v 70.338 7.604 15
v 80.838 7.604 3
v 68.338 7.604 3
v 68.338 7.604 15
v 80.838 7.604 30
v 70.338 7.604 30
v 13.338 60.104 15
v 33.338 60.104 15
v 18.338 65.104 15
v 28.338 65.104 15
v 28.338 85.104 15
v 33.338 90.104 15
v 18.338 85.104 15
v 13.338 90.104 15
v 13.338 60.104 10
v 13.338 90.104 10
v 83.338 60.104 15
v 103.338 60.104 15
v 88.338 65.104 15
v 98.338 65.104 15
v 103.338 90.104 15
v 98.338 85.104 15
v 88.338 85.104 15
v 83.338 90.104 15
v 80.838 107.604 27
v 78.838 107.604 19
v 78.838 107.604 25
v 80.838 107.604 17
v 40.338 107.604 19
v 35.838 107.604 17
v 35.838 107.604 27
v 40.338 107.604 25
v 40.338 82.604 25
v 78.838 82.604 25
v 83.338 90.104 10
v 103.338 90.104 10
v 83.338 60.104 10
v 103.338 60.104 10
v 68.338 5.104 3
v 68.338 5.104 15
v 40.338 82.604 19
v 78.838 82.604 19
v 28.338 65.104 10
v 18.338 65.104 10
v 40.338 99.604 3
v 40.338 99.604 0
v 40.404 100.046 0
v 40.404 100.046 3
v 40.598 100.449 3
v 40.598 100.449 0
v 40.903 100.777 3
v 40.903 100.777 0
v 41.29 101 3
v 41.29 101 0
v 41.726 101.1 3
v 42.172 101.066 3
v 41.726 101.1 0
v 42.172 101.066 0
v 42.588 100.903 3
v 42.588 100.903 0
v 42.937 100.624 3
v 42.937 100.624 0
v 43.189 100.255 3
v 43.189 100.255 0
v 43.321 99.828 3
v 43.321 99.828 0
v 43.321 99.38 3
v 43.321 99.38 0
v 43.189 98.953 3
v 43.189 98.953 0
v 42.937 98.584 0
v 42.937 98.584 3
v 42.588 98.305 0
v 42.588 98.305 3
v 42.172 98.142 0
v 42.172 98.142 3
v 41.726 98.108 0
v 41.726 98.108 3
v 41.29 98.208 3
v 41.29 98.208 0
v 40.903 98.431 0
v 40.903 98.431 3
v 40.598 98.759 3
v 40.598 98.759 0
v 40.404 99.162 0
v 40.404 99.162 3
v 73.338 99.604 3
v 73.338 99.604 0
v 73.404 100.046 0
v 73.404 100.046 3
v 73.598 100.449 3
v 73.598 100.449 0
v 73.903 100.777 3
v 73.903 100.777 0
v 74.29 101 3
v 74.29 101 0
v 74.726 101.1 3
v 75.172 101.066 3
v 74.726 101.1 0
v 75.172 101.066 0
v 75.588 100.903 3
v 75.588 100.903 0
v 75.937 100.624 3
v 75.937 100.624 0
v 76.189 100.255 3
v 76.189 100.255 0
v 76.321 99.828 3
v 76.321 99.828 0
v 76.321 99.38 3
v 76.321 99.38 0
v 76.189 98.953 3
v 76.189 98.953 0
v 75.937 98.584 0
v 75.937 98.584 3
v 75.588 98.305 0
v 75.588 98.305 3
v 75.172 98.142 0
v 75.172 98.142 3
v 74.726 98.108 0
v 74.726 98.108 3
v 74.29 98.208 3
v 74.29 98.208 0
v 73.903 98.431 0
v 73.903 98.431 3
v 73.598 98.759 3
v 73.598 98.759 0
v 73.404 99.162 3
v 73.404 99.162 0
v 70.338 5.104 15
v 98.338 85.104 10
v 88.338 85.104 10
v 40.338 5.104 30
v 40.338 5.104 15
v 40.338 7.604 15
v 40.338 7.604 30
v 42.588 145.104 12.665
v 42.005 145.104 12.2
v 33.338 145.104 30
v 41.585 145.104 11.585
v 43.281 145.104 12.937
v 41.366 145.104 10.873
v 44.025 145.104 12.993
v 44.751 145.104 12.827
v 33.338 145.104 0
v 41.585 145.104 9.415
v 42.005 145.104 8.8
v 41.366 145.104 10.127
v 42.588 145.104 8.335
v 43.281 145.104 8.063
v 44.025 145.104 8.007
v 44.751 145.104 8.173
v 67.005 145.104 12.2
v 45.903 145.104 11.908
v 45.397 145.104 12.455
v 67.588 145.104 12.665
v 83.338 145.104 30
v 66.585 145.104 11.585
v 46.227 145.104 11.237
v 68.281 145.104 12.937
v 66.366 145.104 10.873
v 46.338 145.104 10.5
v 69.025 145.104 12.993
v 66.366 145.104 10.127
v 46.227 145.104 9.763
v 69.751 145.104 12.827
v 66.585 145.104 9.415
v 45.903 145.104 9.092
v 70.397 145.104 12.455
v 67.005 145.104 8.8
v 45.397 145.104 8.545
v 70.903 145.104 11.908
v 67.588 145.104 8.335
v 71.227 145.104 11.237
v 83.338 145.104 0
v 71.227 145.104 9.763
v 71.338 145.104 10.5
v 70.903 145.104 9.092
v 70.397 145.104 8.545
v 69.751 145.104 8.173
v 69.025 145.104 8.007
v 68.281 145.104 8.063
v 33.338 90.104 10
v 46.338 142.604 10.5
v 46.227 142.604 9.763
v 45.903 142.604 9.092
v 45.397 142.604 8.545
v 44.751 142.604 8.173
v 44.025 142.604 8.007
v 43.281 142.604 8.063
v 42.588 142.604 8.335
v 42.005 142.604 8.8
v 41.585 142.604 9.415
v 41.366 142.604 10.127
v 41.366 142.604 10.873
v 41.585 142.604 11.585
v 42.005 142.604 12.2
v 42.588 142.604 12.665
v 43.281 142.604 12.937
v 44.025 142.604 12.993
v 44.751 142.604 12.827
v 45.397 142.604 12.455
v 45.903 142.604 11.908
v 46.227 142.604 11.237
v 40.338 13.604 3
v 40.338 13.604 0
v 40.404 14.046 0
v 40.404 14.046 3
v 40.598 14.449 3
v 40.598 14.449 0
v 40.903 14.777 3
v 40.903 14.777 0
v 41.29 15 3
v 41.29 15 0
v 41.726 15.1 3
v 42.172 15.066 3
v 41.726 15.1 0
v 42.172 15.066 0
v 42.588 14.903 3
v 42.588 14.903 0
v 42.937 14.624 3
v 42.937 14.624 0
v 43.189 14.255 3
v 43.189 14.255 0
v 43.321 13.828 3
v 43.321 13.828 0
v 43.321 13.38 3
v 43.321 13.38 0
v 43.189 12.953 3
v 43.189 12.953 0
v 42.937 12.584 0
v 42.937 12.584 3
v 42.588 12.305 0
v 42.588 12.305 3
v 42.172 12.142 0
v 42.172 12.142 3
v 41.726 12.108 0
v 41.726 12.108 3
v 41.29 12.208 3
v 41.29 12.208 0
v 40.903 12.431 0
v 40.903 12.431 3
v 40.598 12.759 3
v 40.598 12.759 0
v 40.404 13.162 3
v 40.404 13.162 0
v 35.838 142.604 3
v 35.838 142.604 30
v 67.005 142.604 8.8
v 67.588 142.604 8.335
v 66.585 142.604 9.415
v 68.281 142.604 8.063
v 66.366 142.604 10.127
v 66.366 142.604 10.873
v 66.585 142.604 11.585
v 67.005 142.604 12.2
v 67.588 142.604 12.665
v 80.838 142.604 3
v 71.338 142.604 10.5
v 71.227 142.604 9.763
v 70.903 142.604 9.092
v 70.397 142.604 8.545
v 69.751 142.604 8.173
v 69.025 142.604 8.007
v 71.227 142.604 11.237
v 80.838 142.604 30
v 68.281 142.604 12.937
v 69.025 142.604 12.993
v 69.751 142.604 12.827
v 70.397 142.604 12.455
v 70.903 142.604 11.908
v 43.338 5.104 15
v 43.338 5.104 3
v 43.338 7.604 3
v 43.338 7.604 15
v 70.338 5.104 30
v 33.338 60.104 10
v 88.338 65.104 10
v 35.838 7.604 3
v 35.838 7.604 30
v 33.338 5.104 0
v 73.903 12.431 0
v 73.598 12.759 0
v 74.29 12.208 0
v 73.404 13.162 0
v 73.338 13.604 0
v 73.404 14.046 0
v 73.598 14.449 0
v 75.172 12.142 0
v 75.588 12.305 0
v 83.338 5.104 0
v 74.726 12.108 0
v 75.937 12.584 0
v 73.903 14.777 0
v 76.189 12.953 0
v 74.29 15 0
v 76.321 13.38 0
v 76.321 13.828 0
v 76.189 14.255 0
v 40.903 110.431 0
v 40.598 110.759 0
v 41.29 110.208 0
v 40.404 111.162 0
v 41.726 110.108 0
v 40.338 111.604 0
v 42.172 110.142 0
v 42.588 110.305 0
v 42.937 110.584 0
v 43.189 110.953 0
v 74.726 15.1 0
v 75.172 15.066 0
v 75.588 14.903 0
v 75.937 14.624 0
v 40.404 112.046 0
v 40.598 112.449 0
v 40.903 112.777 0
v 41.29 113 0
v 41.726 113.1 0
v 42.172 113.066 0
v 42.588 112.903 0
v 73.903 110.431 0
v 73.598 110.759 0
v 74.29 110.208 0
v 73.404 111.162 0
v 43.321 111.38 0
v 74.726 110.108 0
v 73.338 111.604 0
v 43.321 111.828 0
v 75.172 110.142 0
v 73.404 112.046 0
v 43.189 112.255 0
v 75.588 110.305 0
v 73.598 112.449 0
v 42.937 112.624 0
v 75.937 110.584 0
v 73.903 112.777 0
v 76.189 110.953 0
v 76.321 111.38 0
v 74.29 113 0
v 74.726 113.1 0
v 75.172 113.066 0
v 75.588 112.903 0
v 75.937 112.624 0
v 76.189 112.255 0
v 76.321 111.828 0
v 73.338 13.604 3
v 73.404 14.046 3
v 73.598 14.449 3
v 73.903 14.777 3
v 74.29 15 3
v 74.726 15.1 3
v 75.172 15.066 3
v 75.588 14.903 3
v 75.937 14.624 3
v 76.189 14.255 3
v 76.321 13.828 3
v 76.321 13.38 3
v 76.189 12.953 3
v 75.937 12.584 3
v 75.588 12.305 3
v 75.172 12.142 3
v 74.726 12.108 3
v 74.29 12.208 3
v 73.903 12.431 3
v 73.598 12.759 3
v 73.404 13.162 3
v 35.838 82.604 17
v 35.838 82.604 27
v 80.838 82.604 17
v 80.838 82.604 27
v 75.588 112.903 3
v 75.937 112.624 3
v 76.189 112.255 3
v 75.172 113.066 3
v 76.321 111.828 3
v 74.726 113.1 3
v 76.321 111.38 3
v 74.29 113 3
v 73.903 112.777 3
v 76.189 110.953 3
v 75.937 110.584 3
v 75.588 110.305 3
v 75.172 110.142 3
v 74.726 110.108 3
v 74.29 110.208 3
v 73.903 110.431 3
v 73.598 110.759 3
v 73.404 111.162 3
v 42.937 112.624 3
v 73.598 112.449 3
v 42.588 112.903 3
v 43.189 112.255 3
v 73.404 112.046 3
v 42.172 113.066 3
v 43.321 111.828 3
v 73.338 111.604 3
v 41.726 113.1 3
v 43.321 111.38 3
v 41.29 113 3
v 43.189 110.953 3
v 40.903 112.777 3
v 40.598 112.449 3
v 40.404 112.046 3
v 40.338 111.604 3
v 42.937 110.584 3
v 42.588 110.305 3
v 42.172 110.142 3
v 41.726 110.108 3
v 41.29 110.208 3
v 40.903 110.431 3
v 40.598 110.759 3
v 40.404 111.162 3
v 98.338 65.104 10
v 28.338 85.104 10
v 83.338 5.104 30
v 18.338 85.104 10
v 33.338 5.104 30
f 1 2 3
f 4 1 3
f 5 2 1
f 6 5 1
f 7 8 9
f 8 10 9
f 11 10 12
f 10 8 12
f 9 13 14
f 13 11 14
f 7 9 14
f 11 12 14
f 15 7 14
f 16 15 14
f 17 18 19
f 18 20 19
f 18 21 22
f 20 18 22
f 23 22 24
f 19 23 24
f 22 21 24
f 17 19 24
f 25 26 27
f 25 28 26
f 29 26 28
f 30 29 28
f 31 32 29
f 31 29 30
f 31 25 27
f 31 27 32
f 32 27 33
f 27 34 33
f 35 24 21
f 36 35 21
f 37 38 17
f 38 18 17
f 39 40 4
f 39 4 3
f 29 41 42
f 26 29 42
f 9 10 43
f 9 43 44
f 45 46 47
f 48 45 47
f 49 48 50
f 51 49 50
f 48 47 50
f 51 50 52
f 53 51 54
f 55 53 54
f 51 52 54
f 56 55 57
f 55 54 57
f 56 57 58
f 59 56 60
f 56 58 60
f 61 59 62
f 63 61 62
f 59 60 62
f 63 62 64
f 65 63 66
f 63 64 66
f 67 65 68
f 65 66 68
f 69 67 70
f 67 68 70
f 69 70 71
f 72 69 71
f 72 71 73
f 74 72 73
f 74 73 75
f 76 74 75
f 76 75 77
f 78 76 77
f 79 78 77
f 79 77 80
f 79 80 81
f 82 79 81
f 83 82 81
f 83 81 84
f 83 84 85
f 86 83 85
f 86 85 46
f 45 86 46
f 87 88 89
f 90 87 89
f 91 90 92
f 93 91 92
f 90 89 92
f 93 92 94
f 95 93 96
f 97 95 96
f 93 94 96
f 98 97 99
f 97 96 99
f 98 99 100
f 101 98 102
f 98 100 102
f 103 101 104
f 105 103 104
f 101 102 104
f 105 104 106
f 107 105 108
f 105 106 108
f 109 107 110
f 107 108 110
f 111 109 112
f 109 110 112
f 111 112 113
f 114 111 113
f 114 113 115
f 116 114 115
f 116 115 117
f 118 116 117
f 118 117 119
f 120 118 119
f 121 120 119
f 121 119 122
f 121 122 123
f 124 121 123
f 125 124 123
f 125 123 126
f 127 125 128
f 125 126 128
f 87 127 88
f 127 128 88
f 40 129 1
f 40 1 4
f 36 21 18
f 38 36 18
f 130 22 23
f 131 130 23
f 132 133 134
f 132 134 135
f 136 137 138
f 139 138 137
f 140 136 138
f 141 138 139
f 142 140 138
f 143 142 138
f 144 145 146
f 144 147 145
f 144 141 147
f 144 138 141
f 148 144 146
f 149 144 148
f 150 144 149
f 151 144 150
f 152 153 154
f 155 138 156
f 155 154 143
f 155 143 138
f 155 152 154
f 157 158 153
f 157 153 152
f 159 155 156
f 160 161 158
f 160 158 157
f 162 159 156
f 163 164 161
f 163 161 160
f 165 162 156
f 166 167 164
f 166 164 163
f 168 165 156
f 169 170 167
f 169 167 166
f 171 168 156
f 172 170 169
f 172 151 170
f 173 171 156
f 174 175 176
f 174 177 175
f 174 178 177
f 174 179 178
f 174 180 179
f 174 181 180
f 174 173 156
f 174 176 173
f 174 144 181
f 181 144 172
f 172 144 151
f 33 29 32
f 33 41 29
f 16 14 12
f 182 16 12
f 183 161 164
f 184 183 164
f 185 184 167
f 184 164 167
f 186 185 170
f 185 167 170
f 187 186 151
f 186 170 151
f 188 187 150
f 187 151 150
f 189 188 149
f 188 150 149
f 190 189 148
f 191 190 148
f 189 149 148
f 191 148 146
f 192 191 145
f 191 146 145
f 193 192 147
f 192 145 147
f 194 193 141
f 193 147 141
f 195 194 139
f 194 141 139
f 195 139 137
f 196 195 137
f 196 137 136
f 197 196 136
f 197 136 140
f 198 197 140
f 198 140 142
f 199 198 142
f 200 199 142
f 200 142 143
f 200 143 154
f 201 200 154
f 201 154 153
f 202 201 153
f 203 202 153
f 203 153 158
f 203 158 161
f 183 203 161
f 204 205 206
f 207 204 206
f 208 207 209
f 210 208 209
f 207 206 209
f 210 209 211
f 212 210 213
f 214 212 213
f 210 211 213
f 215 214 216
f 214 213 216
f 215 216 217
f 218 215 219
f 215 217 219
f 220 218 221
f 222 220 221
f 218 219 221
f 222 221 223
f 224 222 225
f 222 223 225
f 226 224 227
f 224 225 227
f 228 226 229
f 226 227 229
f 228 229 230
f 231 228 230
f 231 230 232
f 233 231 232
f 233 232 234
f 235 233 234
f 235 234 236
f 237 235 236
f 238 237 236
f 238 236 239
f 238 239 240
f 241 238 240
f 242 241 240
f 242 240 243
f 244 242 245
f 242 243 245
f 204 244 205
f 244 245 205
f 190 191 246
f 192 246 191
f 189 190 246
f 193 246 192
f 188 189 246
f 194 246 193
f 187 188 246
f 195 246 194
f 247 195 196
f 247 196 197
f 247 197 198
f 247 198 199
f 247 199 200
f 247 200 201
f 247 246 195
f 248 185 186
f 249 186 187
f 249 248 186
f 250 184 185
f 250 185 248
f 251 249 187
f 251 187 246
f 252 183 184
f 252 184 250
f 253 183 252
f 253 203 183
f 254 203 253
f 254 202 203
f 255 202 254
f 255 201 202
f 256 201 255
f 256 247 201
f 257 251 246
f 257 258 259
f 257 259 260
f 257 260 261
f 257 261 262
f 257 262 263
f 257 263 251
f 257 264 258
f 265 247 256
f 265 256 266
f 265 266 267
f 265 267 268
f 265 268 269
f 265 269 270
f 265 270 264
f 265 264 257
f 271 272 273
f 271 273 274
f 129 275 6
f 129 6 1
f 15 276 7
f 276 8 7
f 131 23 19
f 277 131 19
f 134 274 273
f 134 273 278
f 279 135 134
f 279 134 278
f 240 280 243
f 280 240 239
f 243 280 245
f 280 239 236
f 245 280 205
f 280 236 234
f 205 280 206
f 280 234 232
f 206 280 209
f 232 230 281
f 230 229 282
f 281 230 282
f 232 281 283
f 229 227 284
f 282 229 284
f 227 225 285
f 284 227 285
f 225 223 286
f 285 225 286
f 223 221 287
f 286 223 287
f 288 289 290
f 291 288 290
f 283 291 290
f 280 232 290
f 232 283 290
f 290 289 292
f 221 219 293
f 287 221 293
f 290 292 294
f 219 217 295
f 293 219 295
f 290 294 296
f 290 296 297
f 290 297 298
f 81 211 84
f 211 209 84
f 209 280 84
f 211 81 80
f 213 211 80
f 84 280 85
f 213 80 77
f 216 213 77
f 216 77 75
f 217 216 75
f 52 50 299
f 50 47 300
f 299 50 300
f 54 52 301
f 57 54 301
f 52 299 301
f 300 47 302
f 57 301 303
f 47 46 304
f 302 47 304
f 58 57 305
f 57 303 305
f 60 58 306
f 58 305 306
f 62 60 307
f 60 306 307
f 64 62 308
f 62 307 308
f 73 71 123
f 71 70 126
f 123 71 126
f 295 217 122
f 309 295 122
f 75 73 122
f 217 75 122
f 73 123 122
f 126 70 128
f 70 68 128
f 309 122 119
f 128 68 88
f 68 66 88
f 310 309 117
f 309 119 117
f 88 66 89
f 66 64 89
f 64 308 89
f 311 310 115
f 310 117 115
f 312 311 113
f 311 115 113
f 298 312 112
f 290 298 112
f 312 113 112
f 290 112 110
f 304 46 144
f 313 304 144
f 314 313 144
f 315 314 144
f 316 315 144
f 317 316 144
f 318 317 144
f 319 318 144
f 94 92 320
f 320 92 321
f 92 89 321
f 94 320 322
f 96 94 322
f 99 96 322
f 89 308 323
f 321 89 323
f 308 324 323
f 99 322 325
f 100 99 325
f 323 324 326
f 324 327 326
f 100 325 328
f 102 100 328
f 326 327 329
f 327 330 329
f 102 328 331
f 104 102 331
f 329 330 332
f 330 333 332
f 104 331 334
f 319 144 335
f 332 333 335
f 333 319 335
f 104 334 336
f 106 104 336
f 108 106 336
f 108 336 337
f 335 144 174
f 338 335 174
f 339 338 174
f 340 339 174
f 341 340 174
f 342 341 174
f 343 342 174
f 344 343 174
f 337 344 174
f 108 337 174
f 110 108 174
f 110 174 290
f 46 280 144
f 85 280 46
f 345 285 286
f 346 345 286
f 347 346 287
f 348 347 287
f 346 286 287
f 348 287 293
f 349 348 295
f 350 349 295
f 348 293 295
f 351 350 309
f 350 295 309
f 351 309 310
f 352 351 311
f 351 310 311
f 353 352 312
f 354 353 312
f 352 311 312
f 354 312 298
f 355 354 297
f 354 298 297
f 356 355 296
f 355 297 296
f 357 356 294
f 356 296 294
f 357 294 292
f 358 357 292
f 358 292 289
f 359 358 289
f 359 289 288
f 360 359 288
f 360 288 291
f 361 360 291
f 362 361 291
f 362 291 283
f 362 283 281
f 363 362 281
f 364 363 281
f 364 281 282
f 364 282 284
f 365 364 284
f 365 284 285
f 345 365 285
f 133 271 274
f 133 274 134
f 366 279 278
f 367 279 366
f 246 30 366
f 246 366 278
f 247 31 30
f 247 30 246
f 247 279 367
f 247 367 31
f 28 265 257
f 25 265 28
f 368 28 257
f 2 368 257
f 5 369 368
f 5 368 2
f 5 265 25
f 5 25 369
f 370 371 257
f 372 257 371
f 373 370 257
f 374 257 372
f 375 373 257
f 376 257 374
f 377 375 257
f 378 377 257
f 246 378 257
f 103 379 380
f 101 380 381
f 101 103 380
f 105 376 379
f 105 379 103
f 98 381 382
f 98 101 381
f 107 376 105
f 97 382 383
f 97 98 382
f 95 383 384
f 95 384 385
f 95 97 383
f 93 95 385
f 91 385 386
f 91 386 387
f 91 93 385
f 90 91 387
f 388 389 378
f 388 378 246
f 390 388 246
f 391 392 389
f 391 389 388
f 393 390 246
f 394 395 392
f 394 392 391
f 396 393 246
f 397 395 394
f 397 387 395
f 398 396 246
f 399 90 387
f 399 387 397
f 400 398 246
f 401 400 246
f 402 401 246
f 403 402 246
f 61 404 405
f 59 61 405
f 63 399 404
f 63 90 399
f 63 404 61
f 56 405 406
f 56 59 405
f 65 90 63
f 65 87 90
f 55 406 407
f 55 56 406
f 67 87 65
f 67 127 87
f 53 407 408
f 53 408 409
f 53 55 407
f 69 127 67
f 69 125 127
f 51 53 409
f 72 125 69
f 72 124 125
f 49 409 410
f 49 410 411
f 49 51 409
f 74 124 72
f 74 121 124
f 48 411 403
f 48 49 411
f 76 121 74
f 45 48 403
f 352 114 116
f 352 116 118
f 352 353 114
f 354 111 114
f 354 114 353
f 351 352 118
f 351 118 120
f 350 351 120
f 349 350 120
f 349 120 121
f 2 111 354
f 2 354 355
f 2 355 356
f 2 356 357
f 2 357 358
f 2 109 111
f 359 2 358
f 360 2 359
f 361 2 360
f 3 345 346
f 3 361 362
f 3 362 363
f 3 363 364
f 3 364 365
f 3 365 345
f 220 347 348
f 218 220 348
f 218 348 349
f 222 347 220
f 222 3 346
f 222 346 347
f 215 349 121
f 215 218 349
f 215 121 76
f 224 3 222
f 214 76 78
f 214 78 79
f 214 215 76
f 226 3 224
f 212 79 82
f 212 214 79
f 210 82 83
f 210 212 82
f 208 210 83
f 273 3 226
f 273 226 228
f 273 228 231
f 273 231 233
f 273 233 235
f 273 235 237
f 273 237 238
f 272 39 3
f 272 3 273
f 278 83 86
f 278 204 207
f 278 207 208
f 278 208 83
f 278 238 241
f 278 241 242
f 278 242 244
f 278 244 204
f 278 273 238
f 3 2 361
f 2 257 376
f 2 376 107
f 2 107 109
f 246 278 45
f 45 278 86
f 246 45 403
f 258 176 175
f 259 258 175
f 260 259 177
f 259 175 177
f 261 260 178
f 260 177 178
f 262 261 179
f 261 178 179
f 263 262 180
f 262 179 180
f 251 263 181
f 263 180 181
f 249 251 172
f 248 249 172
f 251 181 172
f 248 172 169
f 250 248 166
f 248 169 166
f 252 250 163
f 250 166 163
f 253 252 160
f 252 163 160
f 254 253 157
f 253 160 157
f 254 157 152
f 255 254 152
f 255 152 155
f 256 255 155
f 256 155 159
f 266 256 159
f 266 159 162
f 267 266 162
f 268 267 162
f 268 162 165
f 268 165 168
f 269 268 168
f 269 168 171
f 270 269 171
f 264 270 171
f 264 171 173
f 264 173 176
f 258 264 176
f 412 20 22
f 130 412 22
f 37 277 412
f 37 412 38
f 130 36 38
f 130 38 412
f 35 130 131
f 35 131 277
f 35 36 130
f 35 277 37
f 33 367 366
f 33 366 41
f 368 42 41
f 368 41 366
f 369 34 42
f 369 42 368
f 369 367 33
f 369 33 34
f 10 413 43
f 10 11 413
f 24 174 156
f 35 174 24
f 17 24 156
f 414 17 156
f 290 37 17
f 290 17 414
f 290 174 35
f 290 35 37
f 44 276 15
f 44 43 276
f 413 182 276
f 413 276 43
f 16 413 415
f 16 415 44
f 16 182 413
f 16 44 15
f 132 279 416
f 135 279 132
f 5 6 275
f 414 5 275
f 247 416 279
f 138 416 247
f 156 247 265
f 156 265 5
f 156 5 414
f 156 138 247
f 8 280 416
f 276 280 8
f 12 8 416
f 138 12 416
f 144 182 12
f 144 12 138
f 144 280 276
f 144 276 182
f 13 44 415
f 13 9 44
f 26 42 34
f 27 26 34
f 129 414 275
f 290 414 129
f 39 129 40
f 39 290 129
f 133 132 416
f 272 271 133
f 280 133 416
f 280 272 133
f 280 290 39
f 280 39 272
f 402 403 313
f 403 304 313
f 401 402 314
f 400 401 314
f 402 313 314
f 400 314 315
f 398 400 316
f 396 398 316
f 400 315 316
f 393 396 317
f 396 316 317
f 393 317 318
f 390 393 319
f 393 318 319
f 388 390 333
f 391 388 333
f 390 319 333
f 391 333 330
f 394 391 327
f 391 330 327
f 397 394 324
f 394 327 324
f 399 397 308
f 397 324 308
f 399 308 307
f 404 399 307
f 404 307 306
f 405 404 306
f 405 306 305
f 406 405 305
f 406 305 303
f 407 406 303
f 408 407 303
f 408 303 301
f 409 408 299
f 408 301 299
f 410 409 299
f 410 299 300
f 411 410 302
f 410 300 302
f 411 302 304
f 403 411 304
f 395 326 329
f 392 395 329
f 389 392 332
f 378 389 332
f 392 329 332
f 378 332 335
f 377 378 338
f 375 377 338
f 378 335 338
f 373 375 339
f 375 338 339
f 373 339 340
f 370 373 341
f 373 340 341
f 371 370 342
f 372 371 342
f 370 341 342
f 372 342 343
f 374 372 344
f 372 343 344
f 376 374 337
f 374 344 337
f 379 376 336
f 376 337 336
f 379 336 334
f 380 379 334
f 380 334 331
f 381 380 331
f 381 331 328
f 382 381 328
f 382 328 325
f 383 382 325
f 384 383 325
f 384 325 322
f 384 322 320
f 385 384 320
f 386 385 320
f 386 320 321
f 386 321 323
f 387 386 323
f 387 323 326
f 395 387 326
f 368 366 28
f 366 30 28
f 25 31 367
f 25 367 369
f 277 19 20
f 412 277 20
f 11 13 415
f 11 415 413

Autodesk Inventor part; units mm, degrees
ref_plane "YZ Plane" through (0, 0, 0) normal (1, 0, 0) x (0, 1, 0)
sketch "Sketch1" plane through (0, 0, 0) normal (0, 0, 1) x (1, 0, 0)
  line L0 (33.3378, 145.104) -> (83.3378, 145.104)
  line L1 (83.3378, 145.104) -> (83.3378, 5.104)
  line L2 (83.3378, 5.104) -> (33.3378, 5.104)
  line L3 (33.3378, 5.104) -> (33.3378, 145.104)
  line L4 (33.3378, 90.104) -> (33.3378, 60.104)
  line L5 (83.3378, 90.104) -> (83.3378, 60.104)
  point P0 (0, 0)
  dimension "d0" = 140
  dimension "d1" = 50
extrude "Extrusion1" add sketch "Sketch1" along normal blind 30
sketch "Sketch2" plane through (0, 0, 30) normal (0, 0, 1) x (1, 0, 0)
  line L0 (35.8378, 142.604) -> (80.8378, 142.604)
  line L1 (80.8378, 142.604) -> (80.8378, 7.604)
  line L2 (80.8378, 7.604) -> (35.8378, 7.604)
  line L3 (35.8378, 7.604) -> (35.8378, 142.604)
  line L4 (83.3378, 145.104) -> (33.3378, 145.104) projected
  line L5 (83.3378, 5.104) -> (83.3378, 145.104) projected
  line L6 (33.3378, 5.104) -> (83.3378, 5.104) projected
  line L7 (33.3378, 145.104) -> (33.3378, 5.104) projected
  point P0 (0, 0)
  point P1 (58.3378, 142.604)
  dimension "d4" = 2.5
  dimension "d5" = 2.5
  dimension "d6" = 2.5
  dimension "d7" = 2.5
extrude "Extrusion2" cut sketch "Sketch2" against normal blind 27 contours L0 L1 L2 L3
sketch "Sketch3" plane through (33.3378, 5.104, 0) normal (0, -1, 0) x (1, 0, 0)
  line L0 (7, 30) -> (37, 30)
  line L1 (37, 30) -> (37, 15)
  line L2 (37, 15) -> (7, 15)
  line L3 (7, 15) -> (7, 30)
  line L4 (0, 0) -> (50, 0) projected
  line L5 (0, 0) -> (0, 30) projected
  line L6 (0, 30) -> (50, 30) projected
  line L7 (10, 15) -> (35, 15)
  line L8 (35, 15) -> (35, 3)
  line L9 (35, 3) -> (10, 3)
  line L10 (10, 3) -> (10, 15)
  point P0 (-33.3378, 0)
  point P1 (37, 22.5)
  point P2 (10, 9)
  dimension "d10" = 15
  dimension "d11" = 30
  dimension "d12" = 7
  dimension "d13" = 0
  dimension "d14" = 25
  dimension "d15" = 10
  dimension "d16" = 3
extrude "Extrusion3" cut sketch "Sketch3" against normal blind 27
sketch "Sketch4" plane through (0, 0, 0) normal (0, 0, -1) x (-1, 0, 0)
  circle A0 centre (-74.8378, 13.604) radius 1.5
  circle A1 centre (-41.8378, 13.604) radius 1.5
  circle A2 centre (-41.8378, 99.604) radius 1.5
  circle A3 centre (-74.8378, 99.604) radius 1.5
  circle A4 centre (-41.8378, 111.604) radius 1.5
  circle A5 centre (-74.8378, 111.604) radius 1.5
  line L0 (-83.3378, 5.104) -> (-83.3378, 145.104) projected
  line L1 (-33.3378, 145.104) -> (-33.3378, 5.104) projected
  line L2 (-33.3378, 5.104) -> (-83.3378, 5.104) projected
  line L3 (-83.3378, 145.104) -> (-33.3378, 145.104) projected
  point P0 (0, 0)
  dimension "d19" = 8.5
  dimension "d20" = 8.5
  dimension "d21" = 8.5
  dimension "d22" = 8.5
  dimension "d23" = 3
  dimension "d24" = 3
  dimension "d25" = 8.5
  dimension "d26" = 8.5
  dimension "d27" = 8.5
  dimension "d28" = 8.5
  dimension "d29" = 3
  dimension "d30" = 3
  dimension "d31" = 3
  dimension "d32" = 3
  dimension "d33" = 12
  dimension "d34" = 12
  dimension "d35" = 33.5
  dimension "d36" = 33.5
extrude "Extrusion4" cut sketch "Sketch4" against normal blind 27 contours A0 | A1 | A2 | A3 | A4 | A5
sketch "Sketch5" plane through (33.3378, 145.104, 0) normal (0, 1, 0) x (1, 0, 0)
  circle A0 centre (35.5, -10.5) radius 2.5
  circle A1 centre (10.5, -10.5) radius 2.5
  line L0 (50, 0) -> (50, -30) projected
  line L1 (50, 0) -> (0, 0) projected
  point P0 (-33.3378, 0)
  dimension "d39" = 5
  dimension "d40" = 5
  dimension "d41" = 25
  dimension "d42" = 14.5
  dimension "d43" = 10.5
  dimension "d44" = 10.5
extrude "Extrusion5" cut sketch "Sketch5" against normal blind 27
sketch "Sketch6" plane through (33.3378, 5.104, 0) normal (0, -1, 0) x (1, 0, 0)
  point P0 (-33.3378, 0)
ref_plane "Work Plane1" through (0, 0, 12.5) normal (0, 0, -1) x (-1, 0, 0)
sketch "Sketch7" plane through (0, 0, 12.5) normal (0, 0, -1) x (-1, 0, 0)
  line L0 (-83.3378, 5.104) -> (-83.3378, 145.104) projected
  line L1 (-83.3378, 90.104) -> (-103.3378, 90.104)
  line L2 (-103.3378, 90.104) -> (-103.3378, 60.104)
  line L3 (-103.3378, 60.104) -> (-83.3378, 60.104)
  line L4 (-83.3378, 60.104) -> (-83.3378, 90.104)
  line L5 (-83.3378, 145.104) -> (-33.3378, 145.104) projected
  line L6 (-88.3378, 65.104) -> (-98.3378, 65.104)
  line L7 (-98.3378, 65.104) -> (-98.3378, 85.104)
  line L8 (-98.3378, 85.104) -> (-88.3378, 85.104)
  line L9 (-88.3378, 85.104) -> (-88.3378, 65.104)
  line L10 (-33.3378, 145.104) -> (-33.3378, 5.104) projected
  line L11 (-13.3378, 90.104) -> (-33.3378, 90.104)
  line L12 (-33.3378, 90.104) -> (-33.3378, 60.104)
  line L13 (-33.3378, 60.104) -> (-13.3378, 60.104)
  line L14 (-13.3378, 60.104) -> (-13.3378, 90.104)
  line L15 (-18.3378, 85.104) -> (-28.3378, 85.104)
  line L16 (-28.3378, 85.104) -> (-28.3378, 65.104)
  line L17 (-28.3378, 65.104) -> (-18.3378, 65.104)
  line L18 (-18.3378, 65.104) -> (-18.3378, 85.104)
  point P0 (0, 0)
  point P1 (-93.3378, 60.104)
  dimension "d56" = 20
  dimension "d57" = 30
  dimension "d58" = 55
  dimension "d59" = 5
  dimension "d60" = 20
  dimension "d61" = 30
  dimension "d62" = 55
  dimension "d63" = 5
extrude "Extrusion6" add sketch "Sketch7" along normal mid plane 5
ref_plane "Work Plane2" through (0, 0, 27) normal (0, 0, 1) x (1, 0, 0)
sketch "Sketch8" plane through (0, 0, 27) normal (0, 0, 1) x (1, 0, 0)
  line L0 (80.8378, 142.604) -> (80.8378, 7.604) projected
  line L1 (35.8378, 7.604) -> (35.8378, 142.604) projected
  line L2 (80.8378, 107.604) -> (35.8378, 107.604)
  line L3 (35.8378, 107.604) -> (35.8378, 82.604)
  line L4 (35.8378, 82.604) -> (80.8378, 82.604)
  line L5 (80.8378, 82.604) -> (80.8378, 107.604)
  line L6 (35.8378, 142.604) -> (80.8378, 142.604) projected
  point P0 (0, 0)
  dimension "d67" = 35
  dimension "d68" = 25
extrude "Extrusion7" add sketch "Sketch8" against normal blind 10 contours L0 L4 L1 L2
sketch "Sketch9" plane through (35.8378, 82.604, 27) normal (0, -1, 0) x (1, 0, 0)
  line L0 (43, -2) -> (2, -2)
  line L1 (2, -2) -> (2, -8)
  line L2 (2, -8) -> (43, -8)
  line L3 (43, -8) -> (43, -2)
  line L4 (4.5, -12) -> (4.5, 3) projected
  line L5 (0, 0) -> (45, 0) projected
  line L6 (45, -10) -> (0, -10) projected
  line L7 (0, -10) -> (0, 0) projected
  point P0 (-35.8378, -27)
  point P1 (45, 3)
  point P2 (4.5, -2)
  point P3 (4.5, -8)
  dimension "d72" = 2
  dimension "d73" = 2
  dimension "d74" = 2
  dimension "d75" = 2
extrude "Extrusion8" cut sketch "Sketch9" against normal blind 27 contours L3 L2 L4 L0
properties part number "arduino mould_3r"
